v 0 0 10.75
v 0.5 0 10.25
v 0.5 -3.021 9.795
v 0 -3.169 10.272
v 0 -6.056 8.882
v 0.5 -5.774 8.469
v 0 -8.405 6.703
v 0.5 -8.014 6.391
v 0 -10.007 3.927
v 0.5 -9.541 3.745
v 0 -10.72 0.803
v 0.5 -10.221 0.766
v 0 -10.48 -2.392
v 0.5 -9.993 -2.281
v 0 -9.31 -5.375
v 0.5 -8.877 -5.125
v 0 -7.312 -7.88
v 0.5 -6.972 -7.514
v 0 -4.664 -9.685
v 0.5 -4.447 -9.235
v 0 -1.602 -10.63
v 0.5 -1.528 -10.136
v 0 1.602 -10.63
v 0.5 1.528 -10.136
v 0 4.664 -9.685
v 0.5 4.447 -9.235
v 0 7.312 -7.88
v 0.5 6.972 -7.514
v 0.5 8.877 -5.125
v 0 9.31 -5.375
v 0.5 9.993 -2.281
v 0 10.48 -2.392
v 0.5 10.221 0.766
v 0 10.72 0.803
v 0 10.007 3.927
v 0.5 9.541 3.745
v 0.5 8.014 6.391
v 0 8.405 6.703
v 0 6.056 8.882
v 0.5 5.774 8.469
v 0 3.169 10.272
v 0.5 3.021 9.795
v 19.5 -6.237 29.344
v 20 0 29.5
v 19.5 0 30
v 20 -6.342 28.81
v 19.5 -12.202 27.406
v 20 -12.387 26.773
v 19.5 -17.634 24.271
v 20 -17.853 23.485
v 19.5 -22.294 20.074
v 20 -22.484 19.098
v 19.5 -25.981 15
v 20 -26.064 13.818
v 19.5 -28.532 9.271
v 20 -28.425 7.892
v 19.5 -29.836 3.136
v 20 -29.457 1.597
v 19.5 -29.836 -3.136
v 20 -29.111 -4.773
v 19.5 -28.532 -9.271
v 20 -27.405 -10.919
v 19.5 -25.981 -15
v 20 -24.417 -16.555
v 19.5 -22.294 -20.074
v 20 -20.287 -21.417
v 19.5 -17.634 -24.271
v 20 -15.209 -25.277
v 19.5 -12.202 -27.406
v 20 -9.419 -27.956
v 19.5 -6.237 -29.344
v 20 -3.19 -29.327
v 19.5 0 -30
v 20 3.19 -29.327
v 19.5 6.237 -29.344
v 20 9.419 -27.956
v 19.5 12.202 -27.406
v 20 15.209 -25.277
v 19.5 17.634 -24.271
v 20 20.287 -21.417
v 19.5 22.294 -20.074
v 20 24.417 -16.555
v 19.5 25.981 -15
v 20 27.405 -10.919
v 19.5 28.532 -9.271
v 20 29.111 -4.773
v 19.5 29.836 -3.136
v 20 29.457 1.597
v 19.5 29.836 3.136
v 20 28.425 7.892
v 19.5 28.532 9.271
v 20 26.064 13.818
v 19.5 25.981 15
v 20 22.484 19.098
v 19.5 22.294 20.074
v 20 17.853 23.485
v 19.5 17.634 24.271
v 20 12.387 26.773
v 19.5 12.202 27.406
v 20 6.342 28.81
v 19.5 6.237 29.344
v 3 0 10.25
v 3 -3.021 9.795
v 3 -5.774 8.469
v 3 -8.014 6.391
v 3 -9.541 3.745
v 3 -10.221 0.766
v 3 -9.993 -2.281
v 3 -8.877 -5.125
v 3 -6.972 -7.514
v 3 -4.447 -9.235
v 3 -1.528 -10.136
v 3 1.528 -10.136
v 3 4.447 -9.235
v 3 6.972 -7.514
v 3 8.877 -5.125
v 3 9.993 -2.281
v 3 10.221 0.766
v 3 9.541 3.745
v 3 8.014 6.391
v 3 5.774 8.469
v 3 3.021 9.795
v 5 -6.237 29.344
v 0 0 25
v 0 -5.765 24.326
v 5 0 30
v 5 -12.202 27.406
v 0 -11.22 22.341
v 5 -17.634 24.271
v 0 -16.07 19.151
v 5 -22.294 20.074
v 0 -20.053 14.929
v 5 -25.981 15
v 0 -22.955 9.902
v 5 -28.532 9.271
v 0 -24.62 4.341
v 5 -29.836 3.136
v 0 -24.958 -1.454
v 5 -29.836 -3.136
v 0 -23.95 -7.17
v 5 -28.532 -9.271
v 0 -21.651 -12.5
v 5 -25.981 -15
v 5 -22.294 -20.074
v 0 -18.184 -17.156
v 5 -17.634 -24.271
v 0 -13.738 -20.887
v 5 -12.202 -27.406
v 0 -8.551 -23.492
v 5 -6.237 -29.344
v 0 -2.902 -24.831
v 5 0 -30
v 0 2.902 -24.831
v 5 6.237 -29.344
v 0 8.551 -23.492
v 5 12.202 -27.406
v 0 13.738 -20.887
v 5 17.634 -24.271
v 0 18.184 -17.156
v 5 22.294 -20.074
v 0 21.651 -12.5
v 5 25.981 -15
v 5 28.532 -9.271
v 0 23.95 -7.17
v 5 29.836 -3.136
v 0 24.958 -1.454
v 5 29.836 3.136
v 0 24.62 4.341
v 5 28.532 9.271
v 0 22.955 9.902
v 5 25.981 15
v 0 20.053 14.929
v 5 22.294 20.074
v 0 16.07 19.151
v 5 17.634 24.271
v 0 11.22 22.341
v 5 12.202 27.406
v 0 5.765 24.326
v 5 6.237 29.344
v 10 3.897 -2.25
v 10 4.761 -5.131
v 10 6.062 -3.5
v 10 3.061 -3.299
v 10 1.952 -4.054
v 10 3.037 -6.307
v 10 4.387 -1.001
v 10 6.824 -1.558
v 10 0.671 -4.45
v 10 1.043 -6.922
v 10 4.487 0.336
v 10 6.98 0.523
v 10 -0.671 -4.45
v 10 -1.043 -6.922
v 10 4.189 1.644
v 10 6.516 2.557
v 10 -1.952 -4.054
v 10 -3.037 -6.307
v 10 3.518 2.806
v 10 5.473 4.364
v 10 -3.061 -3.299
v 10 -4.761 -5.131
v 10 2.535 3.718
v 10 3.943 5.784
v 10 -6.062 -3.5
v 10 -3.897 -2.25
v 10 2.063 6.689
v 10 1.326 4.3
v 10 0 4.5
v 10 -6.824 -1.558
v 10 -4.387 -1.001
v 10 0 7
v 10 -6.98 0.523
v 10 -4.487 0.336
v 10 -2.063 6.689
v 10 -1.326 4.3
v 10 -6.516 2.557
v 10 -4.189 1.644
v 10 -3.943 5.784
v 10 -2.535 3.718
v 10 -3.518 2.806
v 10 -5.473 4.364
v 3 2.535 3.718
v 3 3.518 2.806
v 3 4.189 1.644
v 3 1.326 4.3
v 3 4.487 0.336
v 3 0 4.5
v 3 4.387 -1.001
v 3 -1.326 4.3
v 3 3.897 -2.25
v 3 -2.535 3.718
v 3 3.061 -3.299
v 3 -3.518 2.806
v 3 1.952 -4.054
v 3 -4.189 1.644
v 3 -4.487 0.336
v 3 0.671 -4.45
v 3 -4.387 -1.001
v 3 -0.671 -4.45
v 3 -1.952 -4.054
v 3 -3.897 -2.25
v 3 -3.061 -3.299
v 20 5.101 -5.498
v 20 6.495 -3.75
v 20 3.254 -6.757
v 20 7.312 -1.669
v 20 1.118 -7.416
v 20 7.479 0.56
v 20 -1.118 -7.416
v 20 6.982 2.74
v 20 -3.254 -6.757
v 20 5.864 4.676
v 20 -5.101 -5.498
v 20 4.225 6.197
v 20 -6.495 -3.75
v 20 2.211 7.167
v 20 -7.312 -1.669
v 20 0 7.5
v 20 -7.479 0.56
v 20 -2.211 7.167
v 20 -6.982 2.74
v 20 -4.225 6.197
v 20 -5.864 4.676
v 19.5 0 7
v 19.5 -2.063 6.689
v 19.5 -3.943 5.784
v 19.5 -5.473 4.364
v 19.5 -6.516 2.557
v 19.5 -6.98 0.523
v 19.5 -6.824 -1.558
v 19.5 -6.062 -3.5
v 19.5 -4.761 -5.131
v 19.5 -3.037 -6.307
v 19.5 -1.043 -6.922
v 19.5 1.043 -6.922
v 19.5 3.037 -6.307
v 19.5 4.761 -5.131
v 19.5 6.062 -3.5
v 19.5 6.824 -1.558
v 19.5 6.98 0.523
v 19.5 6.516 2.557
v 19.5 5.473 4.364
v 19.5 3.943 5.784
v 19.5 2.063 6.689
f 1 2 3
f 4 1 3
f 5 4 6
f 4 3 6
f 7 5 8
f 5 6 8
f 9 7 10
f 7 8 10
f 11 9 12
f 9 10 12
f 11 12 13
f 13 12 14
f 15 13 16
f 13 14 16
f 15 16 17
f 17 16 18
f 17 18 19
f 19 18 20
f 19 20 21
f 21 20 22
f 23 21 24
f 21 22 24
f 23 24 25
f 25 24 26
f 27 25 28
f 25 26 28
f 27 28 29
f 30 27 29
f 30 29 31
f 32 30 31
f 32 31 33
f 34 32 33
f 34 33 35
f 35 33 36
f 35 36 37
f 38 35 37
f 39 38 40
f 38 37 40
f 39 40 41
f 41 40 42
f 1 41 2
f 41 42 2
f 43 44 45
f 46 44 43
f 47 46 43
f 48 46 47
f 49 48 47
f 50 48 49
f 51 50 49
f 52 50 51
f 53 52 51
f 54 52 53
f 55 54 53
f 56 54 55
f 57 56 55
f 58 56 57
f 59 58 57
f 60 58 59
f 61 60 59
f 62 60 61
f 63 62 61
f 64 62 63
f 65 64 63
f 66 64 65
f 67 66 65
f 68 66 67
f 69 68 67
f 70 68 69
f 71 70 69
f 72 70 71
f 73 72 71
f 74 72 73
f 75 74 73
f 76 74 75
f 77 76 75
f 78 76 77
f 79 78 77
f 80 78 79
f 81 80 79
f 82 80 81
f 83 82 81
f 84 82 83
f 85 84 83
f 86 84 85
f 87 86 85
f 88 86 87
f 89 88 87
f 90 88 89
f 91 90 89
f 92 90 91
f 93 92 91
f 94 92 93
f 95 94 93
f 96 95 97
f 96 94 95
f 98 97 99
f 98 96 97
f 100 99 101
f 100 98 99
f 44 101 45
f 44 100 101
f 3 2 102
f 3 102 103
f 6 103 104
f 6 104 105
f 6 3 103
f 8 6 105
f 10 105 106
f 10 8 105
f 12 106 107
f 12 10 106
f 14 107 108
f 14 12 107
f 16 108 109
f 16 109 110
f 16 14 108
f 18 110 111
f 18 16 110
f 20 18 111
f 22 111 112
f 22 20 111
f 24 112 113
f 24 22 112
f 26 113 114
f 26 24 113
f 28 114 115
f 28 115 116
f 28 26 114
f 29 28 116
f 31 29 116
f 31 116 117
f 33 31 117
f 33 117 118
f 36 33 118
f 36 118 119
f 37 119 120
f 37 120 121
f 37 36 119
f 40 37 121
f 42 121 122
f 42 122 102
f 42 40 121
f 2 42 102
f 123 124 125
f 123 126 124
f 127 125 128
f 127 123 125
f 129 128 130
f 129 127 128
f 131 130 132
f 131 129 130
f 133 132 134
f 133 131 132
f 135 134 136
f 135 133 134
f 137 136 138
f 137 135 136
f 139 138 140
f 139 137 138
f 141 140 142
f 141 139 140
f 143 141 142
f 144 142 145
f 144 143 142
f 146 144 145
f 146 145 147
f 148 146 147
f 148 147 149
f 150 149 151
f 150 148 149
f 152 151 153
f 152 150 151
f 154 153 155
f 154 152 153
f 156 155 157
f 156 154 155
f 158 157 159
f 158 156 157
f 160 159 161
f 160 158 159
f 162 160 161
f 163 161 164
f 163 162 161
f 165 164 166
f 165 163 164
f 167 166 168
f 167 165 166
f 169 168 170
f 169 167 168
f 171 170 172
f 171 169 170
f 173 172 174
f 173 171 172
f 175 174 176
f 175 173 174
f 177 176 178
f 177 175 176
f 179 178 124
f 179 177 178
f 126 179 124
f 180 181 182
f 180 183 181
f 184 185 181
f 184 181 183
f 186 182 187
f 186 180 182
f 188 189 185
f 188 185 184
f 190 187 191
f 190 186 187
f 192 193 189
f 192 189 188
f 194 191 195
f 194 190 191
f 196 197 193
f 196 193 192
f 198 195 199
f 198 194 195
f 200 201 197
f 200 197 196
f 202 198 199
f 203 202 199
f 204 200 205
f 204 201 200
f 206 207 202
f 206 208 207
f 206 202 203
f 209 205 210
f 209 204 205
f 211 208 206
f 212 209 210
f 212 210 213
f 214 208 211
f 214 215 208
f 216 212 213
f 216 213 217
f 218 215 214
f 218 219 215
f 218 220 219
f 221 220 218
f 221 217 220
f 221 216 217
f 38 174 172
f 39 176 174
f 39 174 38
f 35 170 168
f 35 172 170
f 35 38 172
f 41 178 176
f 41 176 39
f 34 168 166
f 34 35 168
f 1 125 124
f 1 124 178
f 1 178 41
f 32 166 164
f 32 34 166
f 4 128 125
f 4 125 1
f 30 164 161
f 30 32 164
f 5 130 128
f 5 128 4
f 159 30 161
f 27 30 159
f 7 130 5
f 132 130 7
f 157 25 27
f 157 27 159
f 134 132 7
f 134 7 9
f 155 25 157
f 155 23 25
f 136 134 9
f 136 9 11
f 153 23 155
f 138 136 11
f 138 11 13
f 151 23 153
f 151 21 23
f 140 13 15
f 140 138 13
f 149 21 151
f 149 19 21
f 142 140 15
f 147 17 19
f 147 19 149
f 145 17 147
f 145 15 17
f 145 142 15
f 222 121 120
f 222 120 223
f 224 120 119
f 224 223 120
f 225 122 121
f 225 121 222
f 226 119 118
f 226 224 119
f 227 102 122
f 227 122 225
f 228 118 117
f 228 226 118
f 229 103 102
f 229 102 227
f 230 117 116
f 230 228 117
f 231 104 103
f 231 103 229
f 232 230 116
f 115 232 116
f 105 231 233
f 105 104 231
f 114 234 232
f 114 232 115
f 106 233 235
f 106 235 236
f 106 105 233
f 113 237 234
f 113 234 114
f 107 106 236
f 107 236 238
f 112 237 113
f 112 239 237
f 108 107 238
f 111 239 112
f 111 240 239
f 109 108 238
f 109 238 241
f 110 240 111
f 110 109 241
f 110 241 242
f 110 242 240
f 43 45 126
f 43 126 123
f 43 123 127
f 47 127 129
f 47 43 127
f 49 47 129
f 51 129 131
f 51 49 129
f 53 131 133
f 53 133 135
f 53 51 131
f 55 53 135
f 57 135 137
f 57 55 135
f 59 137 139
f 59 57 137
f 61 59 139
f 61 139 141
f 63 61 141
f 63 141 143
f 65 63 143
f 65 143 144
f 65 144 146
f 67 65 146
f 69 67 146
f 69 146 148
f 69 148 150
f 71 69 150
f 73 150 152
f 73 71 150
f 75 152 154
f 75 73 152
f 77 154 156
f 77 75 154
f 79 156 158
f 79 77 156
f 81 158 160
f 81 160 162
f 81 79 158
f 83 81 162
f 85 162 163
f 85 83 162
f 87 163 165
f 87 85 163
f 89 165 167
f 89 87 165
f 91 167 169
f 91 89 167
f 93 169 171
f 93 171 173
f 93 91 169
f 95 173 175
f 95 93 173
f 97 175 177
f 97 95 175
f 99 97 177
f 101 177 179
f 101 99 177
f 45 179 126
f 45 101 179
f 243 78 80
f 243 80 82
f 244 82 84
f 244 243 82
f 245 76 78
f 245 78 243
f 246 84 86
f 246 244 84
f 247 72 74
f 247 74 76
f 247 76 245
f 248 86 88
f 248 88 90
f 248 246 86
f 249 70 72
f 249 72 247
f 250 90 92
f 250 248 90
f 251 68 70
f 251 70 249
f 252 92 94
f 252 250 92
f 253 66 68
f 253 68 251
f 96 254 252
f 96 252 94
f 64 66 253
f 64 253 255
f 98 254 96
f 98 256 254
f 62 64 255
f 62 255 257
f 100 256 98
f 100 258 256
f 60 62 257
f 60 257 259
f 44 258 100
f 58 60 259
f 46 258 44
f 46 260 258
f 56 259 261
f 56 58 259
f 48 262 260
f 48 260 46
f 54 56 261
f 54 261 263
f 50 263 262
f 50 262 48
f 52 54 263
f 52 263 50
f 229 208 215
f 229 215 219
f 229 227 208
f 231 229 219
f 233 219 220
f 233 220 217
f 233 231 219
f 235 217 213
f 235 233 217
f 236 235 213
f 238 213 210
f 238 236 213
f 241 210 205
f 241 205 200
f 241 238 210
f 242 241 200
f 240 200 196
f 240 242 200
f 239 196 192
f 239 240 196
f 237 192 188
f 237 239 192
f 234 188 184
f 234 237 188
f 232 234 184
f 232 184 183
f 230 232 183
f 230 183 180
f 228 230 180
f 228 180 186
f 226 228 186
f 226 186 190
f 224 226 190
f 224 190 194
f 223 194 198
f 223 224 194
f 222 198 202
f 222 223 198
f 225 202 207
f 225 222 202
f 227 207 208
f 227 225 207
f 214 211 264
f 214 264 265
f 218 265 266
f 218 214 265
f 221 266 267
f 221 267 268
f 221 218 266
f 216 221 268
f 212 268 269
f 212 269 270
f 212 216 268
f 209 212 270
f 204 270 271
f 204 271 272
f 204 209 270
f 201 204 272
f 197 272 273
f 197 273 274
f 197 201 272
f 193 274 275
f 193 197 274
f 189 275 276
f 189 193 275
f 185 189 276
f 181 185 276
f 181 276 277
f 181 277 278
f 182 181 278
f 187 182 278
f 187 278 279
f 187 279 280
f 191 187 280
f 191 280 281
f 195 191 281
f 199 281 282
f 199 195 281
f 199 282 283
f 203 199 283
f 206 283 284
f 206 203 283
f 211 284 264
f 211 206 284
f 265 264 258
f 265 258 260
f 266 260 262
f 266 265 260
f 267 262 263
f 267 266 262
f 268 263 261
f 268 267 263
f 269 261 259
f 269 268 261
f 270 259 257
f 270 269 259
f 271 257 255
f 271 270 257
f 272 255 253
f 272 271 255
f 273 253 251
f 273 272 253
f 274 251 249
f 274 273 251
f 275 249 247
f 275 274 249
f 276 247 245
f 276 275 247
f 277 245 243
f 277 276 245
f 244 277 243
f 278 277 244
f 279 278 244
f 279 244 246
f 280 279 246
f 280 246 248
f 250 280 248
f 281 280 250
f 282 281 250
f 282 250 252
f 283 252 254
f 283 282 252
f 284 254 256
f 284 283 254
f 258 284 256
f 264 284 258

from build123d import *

# Parameters (mm, degrees)
CHAMFER_1_SIZE = 0.5
CHAMFER_2_SIZE = 0.5


with BuildPart() as part:
    # 스케치2 → 회전1 (revolve)
    with BuildSketch(Plane.XY, mode=Mode.PRIVATE) as revolve_1_sk:
        Polygon((0, 0), (0, 25), (5, 30), (20, 30), (20, 0), align=None)
    revolve(revolve_1_sk.sketch.rotate(Axis((0, 0, 0), (1, 0, 0)), 90), axis=Axis((0, 0, 0), (1, 0, 0)))

    # 스케치4 → 컷-회전1 (revolve, cut)
    with BuildSketch(Plane.XY, mode=Mode.PRIVATE) as cut_revolve_1_sk:
        Polygon((20, 7), (10, 7), (10, 4.5), (3, 4.5), (3, 10.25), (0, 10.25), (0, 0), (20, 0), align=None)
    revolve(cut_revolve_1_sk.sketch.rotate(Axis((0, 0, 0), (1, 0, 0)), 90), axis=Axis((0, 0, 0), (1, 0, 0)), mode=Mode.SUBTRACT)

    # 모따기1
    chamfer_1_edges = [part.edges().sort_by_distance(p)[0] for p in [
        (0, 0, -10.25),
        (20, 0, -7),
    ]]
    chamfer(chamfer_1_edges, length=CHAMFER_1_SIZE)

    # 모따기2
    chamfer_2_edges = [part.edges().sort_by_distance(p)[0] for p in [
        (20, 0, -30),
    ]]
    chamfer(chamfer_2_edges, length=CHAMFER_2_SIZE)


solid = part.part
